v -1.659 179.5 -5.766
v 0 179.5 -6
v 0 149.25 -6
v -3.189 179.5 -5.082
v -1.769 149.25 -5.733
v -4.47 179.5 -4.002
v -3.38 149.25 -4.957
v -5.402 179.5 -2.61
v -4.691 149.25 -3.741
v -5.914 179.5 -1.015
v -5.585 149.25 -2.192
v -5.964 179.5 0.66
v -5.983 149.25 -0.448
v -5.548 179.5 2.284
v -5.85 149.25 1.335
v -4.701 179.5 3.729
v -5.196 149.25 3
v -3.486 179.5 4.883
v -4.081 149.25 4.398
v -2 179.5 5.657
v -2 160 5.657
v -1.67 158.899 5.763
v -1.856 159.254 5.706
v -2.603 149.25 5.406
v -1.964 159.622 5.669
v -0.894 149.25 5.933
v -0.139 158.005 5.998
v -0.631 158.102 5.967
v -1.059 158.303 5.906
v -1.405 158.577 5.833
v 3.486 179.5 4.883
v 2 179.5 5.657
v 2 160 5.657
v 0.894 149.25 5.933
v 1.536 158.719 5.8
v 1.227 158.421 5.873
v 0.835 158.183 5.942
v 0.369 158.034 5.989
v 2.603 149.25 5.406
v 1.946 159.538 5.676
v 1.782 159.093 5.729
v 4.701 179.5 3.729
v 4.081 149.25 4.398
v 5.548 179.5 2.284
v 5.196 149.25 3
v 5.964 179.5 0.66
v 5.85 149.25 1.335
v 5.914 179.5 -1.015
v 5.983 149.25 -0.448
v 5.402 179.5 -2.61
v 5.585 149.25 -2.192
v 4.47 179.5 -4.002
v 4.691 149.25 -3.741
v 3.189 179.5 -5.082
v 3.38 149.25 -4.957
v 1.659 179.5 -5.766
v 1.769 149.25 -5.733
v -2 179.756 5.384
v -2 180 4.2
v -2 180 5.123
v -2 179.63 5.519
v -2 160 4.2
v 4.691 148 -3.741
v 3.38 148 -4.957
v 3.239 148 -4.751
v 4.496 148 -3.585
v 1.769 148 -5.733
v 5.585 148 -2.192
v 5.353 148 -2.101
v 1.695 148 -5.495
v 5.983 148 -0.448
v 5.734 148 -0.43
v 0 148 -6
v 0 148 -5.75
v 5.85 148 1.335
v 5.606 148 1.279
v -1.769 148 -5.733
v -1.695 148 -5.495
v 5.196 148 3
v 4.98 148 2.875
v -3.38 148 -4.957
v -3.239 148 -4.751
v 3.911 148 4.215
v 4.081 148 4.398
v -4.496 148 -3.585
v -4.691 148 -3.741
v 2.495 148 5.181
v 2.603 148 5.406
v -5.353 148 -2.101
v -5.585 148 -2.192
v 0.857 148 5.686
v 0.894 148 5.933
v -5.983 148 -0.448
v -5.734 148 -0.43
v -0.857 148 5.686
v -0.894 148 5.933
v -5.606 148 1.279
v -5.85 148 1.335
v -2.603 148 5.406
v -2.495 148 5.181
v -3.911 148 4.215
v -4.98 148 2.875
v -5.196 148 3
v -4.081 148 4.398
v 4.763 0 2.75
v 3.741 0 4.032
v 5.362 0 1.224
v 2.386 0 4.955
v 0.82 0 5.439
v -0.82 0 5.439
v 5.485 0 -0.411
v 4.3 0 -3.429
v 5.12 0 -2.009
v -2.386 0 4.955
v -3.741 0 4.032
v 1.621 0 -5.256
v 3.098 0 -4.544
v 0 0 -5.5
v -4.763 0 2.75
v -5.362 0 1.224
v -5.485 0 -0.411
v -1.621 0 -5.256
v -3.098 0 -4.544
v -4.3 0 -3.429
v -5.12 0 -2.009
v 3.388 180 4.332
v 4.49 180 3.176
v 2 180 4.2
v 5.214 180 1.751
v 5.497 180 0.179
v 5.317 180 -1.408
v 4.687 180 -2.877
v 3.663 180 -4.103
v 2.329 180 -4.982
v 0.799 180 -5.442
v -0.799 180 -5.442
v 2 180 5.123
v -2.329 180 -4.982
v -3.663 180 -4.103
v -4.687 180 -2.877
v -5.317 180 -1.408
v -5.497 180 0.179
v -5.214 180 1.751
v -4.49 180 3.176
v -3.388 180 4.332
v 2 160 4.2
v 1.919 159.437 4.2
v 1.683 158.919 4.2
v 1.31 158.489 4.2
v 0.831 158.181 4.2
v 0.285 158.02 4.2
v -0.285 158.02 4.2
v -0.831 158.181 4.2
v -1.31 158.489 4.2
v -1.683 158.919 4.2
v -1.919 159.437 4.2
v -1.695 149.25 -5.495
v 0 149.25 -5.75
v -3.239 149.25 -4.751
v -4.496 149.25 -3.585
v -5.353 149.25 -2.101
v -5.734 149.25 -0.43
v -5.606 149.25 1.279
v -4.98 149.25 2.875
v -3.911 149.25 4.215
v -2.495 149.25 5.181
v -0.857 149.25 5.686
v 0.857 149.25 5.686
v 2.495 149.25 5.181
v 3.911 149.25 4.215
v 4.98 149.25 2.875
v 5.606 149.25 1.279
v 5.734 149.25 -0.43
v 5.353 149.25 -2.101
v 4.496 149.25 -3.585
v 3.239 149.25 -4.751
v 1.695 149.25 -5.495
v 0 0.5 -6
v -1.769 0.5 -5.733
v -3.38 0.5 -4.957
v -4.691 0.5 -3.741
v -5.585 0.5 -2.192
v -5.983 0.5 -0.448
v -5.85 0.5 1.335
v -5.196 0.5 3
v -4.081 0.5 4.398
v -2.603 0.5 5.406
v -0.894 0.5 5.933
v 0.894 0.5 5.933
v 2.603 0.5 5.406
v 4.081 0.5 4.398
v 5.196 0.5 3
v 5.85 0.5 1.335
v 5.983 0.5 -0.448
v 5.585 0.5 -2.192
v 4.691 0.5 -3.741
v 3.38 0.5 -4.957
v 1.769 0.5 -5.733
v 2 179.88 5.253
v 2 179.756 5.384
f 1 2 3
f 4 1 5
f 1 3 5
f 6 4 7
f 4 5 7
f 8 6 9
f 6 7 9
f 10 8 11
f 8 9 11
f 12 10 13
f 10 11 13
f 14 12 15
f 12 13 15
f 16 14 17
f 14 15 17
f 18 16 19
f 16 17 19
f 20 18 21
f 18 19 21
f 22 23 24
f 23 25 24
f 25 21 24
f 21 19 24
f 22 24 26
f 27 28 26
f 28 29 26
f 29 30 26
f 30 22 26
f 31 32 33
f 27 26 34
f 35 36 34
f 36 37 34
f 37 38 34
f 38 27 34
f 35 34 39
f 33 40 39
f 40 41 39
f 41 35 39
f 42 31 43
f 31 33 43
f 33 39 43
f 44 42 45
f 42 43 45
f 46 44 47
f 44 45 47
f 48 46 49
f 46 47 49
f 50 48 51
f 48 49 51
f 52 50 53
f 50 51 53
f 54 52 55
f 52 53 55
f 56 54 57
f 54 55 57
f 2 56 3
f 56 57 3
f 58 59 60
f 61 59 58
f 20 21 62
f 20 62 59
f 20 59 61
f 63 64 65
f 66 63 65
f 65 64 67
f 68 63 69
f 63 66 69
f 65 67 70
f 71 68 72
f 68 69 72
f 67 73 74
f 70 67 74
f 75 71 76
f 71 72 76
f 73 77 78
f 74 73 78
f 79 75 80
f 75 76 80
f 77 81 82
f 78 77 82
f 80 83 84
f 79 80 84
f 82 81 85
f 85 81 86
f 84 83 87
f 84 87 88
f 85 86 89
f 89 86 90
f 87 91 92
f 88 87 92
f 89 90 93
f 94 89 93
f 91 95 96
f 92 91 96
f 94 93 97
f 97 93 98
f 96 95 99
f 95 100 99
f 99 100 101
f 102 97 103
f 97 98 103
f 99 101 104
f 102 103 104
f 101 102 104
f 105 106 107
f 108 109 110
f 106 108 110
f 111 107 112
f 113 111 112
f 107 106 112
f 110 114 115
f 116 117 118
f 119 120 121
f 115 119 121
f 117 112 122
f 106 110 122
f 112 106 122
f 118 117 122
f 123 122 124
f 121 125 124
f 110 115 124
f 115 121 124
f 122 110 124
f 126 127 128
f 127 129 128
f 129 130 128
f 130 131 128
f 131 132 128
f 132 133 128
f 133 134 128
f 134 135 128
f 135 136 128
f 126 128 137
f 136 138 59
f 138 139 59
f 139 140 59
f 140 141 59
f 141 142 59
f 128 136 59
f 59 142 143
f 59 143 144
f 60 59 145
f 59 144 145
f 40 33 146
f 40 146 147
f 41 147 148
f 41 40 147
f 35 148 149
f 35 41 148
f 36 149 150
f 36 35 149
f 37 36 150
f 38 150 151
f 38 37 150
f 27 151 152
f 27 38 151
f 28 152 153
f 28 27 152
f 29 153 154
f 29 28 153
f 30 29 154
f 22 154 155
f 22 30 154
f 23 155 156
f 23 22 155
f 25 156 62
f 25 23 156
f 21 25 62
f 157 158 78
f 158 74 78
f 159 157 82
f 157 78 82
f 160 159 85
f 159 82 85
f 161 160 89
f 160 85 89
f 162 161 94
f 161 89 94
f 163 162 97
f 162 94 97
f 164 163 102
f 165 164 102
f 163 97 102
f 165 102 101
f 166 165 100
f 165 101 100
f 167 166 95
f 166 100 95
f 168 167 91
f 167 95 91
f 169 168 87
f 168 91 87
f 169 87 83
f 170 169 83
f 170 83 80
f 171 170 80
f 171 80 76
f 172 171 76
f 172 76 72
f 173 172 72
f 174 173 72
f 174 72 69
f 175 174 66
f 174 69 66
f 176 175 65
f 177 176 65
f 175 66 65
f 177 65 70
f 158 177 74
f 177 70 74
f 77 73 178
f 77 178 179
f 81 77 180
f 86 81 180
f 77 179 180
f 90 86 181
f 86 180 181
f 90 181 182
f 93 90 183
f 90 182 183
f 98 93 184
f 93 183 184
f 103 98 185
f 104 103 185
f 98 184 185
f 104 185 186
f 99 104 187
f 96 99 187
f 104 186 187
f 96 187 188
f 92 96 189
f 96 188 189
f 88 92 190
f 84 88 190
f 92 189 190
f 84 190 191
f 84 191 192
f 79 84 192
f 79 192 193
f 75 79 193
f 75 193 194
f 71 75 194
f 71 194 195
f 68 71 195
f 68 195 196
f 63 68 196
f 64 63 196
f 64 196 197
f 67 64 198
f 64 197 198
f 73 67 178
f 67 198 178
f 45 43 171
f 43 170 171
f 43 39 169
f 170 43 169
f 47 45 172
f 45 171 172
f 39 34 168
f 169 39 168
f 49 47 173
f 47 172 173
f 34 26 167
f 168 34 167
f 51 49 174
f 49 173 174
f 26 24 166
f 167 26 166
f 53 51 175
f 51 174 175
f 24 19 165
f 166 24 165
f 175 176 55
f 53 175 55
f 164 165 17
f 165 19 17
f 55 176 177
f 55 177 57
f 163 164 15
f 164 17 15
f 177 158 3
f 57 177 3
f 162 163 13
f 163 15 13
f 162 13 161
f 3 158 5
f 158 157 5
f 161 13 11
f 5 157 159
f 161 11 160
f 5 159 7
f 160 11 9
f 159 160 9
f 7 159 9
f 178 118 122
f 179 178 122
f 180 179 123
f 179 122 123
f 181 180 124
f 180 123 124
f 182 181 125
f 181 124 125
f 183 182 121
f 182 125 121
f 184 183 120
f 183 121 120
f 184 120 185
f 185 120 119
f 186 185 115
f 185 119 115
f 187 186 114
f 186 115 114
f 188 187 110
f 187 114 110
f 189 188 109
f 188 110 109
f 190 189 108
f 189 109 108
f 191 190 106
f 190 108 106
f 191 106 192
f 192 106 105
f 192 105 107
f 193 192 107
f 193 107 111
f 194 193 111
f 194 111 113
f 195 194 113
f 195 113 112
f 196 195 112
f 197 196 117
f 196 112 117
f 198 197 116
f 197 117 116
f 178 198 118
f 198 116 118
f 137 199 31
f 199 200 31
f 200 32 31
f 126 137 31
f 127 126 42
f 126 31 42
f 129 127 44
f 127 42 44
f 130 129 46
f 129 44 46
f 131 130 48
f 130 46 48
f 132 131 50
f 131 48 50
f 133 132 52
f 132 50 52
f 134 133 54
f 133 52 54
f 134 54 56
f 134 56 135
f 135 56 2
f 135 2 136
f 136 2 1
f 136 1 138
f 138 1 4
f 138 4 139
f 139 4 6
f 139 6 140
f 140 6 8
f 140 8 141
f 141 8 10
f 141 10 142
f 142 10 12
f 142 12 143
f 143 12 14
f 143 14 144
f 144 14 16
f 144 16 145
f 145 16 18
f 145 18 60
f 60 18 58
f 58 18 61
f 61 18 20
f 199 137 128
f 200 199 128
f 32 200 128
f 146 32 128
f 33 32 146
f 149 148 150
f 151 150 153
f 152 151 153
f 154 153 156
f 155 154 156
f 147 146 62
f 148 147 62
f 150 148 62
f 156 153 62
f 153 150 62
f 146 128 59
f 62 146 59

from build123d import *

# Parameters (mm, degrees)
CHAMFER1_SIZE      = 0.5
CUT_EXTRUDE1_DEPTH = 1.8


with BuildPart() as part:
    # Sketch1 → Revolve1 (revolve)
    with BuildSketch(Plane.XY, mode=Mode.PRIVATE) as revolve1_sk:
        Polygon((0, 180), (-6, 180), (-6, 149.25), (-5.75, 149.25), (-5.75, 148), (-6, 148), (-6, 0), (0, 0), align=None)
    revolve(revolve1_sk.sketch.rotate(Axis((0, 180, 0), (0, 1, 0)), 270), axis=Axis((0, 180, 0), (0, 1, 0)))

    # Chamfer1
    chamfer1_edges = [part.edges().sort_by_distance(p)[0] for p in [
        (0, 0, 6),
        (0, 180, 6),
    ]]
    chamfer(chamfer1_edges, length=CHAMFER1_SIZE)

    # Sketch2 → Cut-Extrude1 (cut)
    with BuildSketch(Plane.XY.offset(6)):
        with BuildLine():
            Line((-2, 160), (-2, 180))
            ThreePointArc((-2, 180), (0, 182), (2, 180))
            Line((2, 180), (2, 160))
            ThreePointArc((2, 160), (0, 158), (-2, 160))
        make_face()
    extrude(amount=-CUT_EXTRUDE1_DEPTH, mode=Mode.SUBTRACT)


solid = part.part
